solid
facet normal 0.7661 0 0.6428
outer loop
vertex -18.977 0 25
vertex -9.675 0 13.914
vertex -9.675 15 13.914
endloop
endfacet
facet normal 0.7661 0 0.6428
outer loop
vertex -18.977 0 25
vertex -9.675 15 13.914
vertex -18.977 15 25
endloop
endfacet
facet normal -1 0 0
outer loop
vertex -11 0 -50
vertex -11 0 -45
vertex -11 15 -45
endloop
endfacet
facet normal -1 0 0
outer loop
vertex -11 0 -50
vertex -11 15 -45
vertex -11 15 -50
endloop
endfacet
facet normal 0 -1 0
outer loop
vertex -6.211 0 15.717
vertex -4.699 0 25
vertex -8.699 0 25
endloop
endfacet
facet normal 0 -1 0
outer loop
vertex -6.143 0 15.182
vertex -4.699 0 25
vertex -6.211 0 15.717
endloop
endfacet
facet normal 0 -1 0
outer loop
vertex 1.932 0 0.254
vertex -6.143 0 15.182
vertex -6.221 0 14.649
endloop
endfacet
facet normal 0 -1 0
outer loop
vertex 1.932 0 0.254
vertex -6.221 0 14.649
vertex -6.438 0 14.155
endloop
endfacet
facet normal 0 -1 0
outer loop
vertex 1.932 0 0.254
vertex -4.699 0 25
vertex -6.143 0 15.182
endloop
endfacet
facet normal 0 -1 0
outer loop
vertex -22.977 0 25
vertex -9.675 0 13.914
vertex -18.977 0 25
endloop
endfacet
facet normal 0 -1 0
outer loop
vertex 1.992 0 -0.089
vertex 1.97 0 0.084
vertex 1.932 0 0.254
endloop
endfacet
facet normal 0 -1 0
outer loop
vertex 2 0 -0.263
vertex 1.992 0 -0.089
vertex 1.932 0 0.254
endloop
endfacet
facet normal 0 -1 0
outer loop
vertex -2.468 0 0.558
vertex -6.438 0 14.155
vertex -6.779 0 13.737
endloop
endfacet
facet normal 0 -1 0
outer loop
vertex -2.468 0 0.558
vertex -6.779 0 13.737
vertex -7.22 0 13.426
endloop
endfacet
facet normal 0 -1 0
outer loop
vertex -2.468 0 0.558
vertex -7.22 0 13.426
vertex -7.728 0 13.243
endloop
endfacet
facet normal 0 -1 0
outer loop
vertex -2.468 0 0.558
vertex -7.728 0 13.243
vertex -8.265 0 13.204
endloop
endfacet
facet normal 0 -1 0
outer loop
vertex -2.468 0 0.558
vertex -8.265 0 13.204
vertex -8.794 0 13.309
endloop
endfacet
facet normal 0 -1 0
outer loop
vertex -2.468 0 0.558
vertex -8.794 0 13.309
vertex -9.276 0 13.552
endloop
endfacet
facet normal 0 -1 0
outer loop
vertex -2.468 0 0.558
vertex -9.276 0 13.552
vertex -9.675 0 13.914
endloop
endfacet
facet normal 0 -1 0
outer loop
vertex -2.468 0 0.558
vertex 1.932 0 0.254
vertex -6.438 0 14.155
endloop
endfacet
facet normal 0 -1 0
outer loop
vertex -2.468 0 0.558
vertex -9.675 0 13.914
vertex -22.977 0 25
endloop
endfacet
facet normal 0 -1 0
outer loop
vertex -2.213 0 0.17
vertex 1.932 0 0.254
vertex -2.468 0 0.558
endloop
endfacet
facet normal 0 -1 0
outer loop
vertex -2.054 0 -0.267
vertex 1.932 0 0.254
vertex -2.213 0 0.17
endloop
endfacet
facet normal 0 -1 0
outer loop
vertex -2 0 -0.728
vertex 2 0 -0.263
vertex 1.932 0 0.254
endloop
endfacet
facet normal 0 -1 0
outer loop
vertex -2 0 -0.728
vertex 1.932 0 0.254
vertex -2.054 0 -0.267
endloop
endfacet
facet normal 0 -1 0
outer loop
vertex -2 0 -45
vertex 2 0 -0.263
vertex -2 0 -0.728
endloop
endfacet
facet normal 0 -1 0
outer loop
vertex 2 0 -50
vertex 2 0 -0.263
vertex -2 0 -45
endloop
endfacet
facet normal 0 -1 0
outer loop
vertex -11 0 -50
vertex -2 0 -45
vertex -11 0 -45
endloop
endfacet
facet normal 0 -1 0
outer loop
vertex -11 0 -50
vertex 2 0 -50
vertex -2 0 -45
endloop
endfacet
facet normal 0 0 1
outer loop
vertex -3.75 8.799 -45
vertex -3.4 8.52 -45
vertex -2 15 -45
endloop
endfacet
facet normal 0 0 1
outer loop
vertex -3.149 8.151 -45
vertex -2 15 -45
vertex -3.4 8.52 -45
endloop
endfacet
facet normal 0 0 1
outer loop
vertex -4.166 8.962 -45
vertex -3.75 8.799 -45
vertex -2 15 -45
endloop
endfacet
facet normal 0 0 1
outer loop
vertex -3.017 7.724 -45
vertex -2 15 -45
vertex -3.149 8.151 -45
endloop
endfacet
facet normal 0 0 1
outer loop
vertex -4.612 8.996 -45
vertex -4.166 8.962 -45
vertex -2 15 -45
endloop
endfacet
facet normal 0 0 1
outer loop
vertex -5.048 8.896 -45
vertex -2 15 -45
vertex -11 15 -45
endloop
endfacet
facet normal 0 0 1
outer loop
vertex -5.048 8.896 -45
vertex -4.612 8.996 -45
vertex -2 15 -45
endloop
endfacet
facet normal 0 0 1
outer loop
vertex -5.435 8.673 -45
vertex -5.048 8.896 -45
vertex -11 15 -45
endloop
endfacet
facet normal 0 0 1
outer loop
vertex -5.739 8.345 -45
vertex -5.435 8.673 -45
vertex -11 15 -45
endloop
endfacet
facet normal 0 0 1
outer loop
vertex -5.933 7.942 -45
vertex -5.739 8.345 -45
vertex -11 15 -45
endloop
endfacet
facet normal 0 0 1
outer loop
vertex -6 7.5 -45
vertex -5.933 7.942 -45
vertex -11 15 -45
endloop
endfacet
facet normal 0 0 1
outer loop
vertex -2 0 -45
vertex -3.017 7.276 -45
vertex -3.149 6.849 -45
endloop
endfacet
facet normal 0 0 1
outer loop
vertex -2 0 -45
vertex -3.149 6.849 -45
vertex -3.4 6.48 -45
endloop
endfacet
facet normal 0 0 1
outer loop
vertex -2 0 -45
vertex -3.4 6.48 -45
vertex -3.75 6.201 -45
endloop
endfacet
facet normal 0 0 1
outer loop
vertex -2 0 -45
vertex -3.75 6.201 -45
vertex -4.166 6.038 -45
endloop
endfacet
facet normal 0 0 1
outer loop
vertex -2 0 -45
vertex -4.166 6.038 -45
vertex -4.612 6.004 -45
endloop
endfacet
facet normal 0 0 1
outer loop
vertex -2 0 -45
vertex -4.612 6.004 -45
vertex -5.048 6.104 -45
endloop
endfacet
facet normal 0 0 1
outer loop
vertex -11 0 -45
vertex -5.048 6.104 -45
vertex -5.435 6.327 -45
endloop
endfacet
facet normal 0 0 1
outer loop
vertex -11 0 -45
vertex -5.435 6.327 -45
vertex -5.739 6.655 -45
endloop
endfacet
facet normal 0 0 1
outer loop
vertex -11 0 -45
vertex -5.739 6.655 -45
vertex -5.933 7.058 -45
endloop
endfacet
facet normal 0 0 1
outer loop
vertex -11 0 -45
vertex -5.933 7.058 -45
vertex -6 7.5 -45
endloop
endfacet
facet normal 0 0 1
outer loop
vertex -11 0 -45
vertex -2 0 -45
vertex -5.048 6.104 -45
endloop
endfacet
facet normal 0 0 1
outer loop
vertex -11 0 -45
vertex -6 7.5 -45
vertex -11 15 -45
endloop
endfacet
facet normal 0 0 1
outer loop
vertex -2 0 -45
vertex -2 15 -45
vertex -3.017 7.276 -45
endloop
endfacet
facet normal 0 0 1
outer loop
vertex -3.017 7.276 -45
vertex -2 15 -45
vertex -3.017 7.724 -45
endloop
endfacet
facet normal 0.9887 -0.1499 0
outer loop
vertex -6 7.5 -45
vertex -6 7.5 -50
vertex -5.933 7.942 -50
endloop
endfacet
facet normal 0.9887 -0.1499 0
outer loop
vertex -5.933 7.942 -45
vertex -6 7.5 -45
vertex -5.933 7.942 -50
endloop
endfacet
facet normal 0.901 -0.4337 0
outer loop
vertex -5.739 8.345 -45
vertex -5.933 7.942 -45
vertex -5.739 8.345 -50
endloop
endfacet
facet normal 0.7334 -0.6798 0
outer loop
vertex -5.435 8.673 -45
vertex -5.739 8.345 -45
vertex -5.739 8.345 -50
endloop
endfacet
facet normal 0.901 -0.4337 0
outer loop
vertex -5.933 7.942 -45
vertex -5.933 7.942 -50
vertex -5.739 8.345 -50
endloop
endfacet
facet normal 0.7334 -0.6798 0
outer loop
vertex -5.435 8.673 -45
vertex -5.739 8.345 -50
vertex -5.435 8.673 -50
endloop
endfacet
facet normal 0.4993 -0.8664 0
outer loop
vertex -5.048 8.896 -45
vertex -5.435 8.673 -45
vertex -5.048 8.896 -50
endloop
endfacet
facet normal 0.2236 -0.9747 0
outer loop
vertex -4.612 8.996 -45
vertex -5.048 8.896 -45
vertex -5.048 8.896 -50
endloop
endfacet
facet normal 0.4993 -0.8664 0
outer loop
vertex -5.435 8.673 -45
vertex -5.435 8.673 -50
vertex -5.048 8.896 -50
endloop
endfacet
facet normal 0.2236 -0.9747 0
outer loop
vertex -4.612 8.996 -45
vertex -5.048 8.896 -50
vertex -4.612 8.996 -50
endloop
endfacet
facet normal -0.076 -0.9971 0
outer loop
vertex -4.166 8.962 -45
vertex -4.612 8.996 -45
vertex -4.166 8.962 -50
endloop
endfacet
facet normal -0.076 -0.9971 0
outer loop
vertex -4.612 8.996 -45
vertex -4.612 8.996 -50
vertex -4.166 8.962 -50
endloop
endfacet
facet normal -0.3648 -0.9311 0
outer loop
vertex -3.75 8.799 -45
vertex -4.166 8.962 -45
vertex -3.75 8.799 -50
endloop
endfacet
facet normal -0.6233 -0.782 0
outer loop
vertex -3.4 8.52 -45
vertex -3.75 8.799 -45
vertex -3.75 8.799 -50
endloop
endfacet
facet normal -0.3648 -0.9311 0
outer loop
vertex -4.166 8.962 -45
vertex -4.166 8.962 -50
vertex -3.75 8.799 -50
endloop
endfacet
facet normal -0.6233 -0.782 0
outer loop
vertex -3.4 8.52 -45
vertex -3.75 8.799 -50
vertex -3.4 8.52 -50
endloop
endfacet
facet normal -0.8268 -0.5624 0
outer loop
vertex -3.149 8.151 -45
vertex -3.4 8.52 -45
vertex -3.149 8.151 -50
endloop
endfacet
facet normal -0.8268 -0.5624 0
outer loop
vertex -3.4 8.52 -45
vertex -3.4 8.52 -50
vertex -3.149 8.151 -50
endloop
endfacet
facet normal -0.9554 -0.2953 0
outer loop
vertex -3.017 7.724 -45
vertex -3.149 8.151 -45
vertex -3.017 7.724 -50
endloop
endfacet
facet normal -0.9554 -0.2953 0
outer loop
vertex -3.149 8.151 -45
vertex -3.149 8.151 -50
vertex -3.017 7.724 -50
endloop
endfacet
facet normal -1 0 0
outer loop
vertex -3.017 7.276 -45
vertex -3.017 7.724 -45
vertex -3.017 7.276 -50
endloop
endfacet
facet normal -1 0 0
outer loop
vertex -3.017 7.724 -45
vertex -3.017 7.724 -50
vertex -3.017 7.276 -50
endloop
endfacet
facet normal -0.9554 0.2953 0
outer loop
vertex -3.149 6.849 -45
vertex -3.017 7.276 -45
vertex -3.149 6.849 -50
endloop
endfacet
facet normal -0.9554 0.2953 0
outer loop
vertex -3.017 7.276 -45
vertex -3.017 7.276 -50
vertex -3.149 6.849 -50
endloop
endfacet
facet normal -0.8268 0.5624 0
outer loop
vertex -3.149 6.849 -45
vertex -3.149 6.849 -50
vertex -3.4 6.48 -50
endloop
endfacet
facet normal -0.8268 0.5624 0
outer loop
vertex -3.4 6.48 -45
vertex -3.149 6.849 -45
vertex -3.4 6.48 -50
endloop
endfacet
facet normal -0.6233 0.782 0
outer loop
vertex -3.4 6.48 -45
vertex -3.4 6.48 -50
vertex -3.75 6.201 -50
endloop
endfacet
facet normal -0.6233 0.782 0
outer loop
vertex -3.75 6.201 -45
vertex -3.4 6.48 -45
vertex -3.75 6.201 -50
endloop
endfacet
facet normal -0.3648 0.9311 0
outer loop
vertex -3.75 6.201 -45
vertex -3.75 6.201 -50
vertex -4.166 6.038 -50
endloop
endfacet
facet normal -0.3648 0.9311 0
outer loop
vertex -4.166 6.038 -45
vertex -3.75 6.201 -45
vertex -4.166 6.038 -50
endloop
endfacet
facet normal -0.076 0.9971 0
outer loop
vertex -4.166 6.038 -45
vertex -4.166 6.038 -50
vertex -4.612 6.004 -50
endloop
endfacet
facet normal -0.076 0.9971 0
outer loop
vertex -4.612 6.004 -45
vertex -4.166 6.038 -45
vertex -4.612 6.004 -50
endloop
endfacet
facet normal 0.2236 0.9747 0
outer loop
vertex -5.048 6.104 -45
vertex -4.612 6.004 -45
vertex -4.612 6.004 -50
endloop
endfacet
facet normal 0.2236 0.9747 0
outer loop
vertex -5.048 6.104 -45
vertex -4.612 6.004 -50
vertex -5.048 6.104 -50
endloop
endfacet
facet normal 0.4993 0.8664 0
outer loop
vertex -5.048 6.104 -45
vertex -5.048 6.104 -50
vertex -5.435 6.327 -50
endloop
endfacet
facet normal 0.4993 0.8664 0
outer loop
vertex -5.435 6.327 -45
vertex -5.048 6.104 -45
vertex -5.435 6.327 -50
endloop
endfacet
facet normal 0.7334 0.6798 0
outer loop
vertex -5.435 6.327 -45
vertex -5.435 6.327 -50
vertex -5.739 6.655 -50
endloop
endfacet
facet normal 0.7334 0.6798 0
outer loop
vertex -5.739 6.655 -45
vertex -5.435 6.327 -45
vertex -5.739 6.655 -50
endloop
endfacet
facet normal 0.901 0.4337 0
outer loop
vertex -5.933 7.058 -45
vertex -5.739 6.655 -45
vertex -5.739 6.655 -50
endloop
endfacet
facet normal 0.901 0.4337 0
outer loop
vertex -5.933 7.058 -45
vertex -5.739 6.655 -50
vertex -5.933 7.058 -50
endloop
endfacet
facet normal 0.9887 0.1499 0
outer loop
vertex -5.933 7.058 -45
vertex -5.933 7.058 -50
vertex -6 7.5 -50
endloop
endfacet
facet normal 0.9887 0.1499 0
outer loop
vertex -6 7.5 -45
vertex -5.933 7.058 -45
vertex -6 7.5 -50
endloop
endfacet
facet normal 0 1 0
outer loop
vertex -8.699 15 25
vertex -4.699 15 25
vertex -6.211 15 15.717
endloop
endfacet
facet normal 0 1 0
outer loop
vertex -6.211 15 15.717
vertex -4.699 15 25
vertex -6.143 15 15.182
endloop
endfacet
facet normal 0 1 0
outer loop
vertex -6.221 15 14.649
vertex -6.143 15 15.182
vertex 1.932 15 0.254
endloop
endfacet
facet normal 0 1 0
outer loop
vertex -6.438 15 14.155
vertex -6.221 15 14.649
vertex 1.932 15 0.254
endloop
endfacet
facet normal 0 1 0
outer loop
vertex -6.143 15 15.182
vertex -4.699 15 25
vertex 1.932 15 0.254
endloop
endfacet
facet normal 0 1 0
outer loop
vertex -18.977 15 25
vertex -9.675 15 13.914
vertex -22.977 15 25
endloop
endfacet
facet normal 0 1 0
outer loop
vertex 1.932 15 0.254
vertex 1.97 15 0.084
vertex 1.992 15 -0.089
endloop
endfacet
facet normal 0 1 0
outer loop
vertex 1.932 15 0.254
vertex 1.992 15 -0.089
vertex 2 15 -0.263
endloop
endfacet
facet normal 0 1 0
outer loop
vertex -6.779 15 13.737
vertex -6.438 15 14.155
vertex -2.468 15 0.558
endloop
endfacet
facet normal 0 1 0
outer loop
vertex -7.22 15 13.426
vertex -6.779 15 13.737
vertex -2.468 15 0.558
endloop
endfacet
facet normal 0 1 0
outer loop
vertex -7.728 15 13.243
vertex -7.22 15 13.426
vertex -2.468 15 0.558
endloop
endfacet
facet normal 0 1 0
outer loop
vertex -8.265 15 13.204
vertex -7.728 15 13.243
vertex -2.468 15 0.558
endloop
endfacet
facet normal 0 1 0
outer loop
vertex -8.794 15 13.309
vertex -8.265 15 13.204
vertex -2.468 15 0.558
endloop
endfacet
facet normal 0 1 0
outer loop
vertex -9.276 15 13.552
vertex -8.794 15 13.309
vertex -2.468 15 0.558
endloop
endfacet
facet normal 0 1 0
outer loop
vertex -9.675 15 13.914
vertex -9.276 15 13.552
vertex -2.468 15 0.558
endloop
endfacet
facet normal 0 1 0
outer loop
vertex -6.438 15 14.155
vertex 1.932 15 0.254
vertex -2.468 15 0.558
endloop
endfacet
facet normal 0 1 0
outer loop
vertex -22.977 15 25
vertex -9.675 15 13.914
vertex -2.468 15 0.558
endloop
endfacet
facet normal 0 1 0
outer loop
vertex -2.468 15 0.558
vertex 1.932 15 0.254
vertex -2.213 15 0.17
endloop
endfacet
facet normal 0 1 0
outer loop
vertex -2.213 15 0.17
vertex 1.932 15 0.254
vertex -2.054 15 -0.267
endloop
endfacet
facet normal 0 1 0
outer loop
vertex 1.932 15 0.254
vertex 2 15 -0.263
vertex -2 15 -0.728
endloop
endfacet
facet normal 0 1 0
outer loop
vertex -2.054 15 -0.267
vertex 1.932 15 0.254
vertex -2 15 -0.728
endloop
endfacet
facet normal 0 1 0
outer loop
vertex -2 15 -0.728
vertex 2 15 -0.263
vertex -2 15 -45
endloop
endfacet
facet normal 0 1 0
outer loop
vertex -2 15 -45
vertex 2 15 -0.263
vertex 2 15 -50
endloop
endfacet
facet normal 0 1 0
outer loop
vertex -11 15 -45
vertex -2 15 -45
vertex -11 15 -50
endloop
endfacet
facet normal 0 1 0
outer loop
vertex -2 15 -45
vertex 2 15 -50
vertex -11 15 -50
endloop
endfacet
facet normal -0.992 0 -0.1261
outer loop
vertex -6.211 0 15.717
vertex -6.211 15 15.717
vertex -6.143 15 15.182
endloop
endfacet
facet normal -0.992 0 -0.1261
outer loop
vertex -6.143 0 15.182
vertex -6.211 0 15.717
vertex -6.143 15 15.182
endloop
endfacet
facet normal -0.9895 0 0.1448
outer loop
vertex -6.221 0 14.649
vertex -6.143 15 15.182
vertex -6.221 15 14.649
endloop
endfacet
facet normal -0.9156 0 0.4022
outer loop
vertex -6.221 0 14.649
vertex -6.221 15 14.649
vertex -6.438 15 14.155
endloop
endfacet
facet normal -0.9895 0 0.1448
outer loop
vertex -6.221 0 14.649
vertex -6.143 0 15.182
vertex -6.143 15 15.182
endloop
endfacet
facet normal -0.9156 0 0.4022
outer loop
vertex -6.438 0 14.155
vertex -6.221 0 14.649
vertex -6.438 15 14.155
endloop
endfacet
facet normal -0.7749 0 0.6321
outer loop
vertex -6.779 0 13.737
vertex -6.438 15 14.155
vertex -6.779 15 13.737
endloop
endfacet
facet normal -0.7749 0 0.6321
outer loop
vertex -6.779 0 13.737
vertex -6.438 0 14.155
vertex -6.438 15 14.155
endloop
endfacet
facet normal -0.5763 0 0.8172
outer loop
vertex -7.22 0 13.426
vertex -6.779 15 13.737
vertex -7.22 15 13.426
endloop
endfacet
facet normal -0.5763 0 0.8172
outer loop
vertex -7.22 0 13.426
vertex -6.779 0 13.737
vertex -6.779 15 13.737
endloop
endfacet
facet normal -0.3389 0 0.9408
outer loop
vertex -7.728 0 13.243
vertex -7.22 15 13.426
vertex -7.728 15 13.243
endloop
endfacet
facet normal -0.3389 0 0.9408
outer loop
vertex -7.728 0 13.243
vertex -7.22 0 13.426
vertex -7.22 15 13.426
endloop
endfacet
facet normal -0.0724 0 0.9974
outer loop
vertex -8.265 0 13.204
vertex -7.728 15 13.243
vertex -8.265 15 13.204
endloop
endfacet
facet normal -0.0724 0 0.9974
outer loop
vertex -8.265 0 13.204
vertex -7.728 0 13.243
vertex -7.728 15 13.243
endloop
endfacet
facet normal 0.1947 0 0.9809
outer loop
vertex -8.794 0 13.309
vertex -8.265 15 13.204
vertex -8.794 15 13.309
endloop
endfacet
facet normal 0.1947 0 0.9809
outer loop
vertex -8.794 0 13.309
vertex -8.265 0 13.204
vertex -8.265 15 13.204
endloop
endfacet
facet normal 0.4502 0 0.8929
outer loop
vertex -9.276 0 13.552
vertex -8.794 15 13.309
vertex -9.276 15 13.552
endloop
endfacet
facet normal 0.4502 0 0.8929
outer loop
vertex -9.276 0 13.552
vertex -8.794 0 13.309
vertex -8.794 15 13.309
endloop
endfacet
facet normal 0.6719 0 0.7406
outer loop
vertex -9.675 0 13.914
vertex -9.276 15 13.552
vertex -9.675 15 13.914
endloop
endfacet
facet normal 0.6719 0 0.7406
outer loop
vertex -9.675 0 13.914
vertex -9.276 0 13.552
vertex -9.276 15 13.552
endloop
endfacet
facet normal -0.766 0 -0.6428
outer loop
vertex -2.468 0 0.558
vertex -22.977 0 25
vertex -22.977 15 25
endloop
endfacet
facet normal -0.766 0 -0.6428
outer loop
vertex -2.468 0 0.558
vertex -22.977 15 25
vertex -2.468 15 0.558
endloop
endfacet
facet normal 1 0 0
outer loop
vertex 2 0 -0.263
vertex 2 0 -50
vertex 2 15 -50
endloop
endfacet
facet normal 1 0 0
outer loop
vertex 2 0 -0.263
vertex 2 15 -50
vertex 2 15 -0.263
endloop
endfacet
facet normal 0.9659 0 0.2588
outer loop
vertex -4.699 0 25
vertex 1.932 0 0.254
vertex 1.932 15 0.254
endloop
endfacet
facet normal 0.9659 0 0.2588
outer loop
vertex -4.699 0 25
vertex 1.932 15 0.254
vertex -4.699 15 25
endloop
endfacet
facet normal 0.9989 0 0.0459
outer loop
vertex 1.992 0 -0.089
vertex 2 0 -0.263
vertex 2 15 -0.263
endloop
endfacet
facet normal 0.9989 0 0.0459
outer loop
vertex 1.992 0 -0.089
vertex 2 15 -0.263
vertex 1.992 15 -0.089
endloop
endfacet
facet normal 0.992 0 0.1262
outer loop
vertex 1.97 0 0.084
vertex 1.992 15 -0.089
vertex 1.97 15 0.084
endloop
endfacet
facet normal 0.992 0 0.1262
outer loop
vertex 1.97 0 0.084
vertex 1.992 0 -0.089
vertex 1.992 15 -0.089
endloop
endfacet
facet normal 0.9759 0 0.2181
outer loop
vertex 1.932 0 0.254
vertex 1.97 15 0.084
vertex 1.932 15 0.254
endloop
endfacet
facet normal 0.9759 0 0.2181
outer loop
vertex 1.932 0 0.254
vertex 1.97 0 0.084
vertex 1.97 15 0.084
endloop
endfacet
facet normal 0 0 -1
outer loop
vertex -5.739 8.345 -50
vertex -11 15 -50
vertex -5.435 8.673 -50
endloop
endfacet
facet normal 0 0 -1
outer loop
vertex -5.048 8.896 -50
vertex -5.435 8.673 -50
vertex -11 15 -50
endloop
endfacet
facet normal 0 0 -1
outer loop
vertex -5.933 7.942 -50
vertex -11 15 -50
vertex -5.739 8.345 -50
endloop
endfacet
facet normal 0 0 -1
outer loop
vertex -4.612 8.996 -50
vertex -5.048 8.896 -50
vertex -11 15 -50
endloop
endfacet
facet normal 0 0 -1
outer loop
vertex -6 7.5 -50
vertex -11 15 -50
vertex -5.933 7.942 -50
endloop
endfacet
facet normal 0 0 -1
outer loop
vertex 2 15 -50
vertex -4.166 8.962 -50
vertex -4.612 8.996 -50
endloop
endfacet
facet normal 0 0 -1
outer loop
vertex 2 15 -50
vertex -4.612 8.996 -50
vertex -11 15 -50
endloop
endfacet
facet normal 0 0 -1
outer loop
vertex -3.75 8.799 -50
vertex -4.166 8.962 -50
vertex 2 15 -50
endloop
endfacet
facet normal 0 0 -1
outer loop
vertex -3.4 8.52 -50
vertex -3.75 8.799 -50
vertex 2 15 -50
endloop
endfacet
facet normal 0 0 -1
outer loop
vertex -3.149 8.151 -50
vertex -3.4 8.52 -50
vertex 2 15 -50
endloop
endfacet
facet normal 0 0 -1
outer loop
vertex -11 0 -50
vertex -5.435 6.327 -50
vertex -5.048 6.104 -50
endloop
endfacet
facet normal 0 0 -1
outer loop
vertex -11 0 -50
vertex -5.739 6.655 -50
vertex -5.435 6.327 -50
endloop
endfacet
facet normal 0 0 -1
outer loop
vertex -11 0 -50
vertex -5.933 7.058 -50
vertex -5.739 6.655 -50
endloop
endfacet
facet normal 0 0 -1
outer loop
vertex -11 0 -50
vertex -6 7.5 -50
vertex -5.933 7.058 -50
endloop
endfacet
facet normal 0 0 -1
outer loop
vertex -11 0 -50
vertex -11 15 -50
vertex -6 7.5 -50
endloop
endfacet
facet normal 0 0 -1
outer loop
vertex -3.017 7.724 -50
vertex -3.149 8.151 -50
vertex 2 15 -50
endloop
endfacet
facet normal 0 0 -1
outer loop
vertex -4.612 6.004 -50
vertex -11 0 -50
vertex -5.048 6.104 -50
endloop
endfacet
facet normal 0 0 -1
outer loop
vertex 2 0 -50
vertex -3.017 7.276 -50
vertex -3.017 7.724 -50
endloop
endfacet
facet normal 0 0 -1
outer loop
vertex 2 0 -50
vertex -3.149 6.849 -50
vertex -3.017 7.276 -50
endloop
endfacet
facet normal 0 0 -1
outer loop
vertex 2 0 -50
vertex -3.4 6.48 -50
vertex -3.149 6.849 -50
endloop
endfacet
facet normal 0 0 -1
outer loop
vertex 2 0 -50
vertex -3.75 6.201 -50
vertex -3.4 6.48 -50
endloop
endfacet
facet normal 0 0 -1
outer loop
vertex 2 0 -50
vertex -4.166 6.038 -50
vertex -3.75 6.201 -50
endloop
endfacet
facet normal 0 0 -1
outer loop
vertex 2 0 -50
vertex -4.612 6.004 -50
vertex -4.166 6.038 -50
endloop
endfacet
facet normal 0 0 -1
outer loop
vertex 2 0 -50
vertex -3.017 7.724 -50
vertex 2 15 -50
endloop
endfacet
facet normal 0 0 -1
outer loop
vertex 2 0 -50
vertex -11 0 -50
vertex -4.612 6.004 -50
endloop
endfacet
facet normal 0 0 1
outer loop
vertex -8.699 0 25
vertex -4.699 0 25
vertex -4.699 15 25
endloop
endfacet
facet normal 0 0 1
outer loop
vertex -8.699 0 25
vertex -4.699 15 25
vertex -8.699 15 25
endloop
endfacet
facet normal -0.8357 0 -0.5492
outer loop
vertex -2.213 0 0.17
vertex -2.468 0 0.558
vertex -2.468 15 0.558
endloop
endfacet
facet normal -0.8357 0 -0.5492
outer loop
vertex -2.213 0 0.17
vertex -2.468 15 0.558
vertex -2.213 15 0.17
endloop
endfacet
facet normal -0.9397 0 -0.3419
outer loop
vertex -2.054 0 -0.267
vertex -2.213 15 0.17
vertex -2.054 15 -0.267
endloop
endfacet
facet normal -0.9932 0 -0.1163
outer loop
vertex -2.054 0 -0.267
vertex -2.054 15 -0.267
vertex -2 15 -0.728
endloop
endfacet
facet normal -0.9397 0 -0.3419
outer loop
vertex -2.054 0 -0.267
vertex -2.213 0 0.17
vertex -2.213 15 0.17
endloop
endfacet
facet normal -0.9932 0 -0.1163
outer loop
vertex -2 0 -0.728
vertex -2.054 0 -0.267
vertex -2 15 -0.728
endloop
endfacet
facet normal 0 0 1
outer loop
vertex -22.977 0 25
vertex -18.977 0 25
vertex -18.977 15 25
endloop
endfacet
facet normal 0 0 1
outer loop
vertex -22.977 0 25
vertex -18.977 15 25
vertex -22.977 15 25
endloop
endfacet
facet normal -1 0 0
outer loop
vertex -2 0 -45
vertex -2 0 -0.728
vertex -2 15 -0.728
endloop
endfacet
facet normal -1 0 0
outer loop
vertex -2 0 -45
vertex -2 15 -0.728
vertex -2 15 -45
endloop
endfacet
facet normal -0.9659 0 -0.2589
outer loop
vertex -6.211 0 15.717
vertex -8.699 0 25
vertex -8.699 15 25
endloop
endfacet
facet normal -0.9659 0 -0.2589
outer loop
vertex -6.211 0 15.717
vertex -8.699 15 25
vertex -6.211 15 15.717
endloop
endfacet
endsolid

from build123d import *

# Parameters (mm, degrees)
BOSS_EXTRUDE1_DEPTH = 15
SKETCH3_R           = 1.5
CUT_EXTRUDE2_DEPTH  = 10


with BuildPart() as part:
    # Sketch1 → Boss-Extrude1 (new body)
    with BuildSketch(Plane(origin=(0, 0, 0), x_dir=(1, 0, 0), z_dir=(0, 1, 0))):
        with BuildLine():
            Line((-2, 0.727940469), (-2, 30))
            Line((-2, 30), (-2, 45))
            Line((-2, 45), (-11, 45))
            Line((-11, 45), (-11, 50))
            Line((-11, 50), (2, 50))
            Line((2, 50), (2, 30))
            Line((2, 30), (2, 0.263304995))
            ThreePointArc((2, 0.263304995), (1.982889723, 0.002252611), (1.931851653, -0.254333095))
            Line((1.931851653, -0.254333095), (-4.698729811, -25))
            Line((-4.698729811, -25), (-8.698729811, -25))
            Line((-8.698729811, -25), (-6.211472263, -15.717428462))
            ThreePointArc((-6.211472263, -15.717428462), (-7.219826689, -13.425768705), (-9.675412802, -13.914215152))
            Line((-9.675412802, -13.914215152), (-18.977490779, -25))
            Line((-18.977490779, -25), (-22.977490779, -25))
            Line((-22.977490779, -25), (-2.467911114, -0.557634751))
            ThreePointArc((-2.467911114, -0.557634751), (-2.120614758, 0.043900182), (-2, 0.727940469))
        make_face()
    extrude(amount=BOSS_EXTRUDE1_DEPTH)

    # Sketch3 → Cut-Extrude2 (cut)
    with BuildSketch(Plane(origin=(0, 0, -50), x_dir=(-1, 0, 0), z_dir=(0, 0, -1))):
        with Locations((4.5, 7.5)):
            Circle(SKETCH3_R)
    extrude(amount=-CUT_EXTRUDE2_DEPTH, mode=Mode.SUBTRACT)


solid = part.part
